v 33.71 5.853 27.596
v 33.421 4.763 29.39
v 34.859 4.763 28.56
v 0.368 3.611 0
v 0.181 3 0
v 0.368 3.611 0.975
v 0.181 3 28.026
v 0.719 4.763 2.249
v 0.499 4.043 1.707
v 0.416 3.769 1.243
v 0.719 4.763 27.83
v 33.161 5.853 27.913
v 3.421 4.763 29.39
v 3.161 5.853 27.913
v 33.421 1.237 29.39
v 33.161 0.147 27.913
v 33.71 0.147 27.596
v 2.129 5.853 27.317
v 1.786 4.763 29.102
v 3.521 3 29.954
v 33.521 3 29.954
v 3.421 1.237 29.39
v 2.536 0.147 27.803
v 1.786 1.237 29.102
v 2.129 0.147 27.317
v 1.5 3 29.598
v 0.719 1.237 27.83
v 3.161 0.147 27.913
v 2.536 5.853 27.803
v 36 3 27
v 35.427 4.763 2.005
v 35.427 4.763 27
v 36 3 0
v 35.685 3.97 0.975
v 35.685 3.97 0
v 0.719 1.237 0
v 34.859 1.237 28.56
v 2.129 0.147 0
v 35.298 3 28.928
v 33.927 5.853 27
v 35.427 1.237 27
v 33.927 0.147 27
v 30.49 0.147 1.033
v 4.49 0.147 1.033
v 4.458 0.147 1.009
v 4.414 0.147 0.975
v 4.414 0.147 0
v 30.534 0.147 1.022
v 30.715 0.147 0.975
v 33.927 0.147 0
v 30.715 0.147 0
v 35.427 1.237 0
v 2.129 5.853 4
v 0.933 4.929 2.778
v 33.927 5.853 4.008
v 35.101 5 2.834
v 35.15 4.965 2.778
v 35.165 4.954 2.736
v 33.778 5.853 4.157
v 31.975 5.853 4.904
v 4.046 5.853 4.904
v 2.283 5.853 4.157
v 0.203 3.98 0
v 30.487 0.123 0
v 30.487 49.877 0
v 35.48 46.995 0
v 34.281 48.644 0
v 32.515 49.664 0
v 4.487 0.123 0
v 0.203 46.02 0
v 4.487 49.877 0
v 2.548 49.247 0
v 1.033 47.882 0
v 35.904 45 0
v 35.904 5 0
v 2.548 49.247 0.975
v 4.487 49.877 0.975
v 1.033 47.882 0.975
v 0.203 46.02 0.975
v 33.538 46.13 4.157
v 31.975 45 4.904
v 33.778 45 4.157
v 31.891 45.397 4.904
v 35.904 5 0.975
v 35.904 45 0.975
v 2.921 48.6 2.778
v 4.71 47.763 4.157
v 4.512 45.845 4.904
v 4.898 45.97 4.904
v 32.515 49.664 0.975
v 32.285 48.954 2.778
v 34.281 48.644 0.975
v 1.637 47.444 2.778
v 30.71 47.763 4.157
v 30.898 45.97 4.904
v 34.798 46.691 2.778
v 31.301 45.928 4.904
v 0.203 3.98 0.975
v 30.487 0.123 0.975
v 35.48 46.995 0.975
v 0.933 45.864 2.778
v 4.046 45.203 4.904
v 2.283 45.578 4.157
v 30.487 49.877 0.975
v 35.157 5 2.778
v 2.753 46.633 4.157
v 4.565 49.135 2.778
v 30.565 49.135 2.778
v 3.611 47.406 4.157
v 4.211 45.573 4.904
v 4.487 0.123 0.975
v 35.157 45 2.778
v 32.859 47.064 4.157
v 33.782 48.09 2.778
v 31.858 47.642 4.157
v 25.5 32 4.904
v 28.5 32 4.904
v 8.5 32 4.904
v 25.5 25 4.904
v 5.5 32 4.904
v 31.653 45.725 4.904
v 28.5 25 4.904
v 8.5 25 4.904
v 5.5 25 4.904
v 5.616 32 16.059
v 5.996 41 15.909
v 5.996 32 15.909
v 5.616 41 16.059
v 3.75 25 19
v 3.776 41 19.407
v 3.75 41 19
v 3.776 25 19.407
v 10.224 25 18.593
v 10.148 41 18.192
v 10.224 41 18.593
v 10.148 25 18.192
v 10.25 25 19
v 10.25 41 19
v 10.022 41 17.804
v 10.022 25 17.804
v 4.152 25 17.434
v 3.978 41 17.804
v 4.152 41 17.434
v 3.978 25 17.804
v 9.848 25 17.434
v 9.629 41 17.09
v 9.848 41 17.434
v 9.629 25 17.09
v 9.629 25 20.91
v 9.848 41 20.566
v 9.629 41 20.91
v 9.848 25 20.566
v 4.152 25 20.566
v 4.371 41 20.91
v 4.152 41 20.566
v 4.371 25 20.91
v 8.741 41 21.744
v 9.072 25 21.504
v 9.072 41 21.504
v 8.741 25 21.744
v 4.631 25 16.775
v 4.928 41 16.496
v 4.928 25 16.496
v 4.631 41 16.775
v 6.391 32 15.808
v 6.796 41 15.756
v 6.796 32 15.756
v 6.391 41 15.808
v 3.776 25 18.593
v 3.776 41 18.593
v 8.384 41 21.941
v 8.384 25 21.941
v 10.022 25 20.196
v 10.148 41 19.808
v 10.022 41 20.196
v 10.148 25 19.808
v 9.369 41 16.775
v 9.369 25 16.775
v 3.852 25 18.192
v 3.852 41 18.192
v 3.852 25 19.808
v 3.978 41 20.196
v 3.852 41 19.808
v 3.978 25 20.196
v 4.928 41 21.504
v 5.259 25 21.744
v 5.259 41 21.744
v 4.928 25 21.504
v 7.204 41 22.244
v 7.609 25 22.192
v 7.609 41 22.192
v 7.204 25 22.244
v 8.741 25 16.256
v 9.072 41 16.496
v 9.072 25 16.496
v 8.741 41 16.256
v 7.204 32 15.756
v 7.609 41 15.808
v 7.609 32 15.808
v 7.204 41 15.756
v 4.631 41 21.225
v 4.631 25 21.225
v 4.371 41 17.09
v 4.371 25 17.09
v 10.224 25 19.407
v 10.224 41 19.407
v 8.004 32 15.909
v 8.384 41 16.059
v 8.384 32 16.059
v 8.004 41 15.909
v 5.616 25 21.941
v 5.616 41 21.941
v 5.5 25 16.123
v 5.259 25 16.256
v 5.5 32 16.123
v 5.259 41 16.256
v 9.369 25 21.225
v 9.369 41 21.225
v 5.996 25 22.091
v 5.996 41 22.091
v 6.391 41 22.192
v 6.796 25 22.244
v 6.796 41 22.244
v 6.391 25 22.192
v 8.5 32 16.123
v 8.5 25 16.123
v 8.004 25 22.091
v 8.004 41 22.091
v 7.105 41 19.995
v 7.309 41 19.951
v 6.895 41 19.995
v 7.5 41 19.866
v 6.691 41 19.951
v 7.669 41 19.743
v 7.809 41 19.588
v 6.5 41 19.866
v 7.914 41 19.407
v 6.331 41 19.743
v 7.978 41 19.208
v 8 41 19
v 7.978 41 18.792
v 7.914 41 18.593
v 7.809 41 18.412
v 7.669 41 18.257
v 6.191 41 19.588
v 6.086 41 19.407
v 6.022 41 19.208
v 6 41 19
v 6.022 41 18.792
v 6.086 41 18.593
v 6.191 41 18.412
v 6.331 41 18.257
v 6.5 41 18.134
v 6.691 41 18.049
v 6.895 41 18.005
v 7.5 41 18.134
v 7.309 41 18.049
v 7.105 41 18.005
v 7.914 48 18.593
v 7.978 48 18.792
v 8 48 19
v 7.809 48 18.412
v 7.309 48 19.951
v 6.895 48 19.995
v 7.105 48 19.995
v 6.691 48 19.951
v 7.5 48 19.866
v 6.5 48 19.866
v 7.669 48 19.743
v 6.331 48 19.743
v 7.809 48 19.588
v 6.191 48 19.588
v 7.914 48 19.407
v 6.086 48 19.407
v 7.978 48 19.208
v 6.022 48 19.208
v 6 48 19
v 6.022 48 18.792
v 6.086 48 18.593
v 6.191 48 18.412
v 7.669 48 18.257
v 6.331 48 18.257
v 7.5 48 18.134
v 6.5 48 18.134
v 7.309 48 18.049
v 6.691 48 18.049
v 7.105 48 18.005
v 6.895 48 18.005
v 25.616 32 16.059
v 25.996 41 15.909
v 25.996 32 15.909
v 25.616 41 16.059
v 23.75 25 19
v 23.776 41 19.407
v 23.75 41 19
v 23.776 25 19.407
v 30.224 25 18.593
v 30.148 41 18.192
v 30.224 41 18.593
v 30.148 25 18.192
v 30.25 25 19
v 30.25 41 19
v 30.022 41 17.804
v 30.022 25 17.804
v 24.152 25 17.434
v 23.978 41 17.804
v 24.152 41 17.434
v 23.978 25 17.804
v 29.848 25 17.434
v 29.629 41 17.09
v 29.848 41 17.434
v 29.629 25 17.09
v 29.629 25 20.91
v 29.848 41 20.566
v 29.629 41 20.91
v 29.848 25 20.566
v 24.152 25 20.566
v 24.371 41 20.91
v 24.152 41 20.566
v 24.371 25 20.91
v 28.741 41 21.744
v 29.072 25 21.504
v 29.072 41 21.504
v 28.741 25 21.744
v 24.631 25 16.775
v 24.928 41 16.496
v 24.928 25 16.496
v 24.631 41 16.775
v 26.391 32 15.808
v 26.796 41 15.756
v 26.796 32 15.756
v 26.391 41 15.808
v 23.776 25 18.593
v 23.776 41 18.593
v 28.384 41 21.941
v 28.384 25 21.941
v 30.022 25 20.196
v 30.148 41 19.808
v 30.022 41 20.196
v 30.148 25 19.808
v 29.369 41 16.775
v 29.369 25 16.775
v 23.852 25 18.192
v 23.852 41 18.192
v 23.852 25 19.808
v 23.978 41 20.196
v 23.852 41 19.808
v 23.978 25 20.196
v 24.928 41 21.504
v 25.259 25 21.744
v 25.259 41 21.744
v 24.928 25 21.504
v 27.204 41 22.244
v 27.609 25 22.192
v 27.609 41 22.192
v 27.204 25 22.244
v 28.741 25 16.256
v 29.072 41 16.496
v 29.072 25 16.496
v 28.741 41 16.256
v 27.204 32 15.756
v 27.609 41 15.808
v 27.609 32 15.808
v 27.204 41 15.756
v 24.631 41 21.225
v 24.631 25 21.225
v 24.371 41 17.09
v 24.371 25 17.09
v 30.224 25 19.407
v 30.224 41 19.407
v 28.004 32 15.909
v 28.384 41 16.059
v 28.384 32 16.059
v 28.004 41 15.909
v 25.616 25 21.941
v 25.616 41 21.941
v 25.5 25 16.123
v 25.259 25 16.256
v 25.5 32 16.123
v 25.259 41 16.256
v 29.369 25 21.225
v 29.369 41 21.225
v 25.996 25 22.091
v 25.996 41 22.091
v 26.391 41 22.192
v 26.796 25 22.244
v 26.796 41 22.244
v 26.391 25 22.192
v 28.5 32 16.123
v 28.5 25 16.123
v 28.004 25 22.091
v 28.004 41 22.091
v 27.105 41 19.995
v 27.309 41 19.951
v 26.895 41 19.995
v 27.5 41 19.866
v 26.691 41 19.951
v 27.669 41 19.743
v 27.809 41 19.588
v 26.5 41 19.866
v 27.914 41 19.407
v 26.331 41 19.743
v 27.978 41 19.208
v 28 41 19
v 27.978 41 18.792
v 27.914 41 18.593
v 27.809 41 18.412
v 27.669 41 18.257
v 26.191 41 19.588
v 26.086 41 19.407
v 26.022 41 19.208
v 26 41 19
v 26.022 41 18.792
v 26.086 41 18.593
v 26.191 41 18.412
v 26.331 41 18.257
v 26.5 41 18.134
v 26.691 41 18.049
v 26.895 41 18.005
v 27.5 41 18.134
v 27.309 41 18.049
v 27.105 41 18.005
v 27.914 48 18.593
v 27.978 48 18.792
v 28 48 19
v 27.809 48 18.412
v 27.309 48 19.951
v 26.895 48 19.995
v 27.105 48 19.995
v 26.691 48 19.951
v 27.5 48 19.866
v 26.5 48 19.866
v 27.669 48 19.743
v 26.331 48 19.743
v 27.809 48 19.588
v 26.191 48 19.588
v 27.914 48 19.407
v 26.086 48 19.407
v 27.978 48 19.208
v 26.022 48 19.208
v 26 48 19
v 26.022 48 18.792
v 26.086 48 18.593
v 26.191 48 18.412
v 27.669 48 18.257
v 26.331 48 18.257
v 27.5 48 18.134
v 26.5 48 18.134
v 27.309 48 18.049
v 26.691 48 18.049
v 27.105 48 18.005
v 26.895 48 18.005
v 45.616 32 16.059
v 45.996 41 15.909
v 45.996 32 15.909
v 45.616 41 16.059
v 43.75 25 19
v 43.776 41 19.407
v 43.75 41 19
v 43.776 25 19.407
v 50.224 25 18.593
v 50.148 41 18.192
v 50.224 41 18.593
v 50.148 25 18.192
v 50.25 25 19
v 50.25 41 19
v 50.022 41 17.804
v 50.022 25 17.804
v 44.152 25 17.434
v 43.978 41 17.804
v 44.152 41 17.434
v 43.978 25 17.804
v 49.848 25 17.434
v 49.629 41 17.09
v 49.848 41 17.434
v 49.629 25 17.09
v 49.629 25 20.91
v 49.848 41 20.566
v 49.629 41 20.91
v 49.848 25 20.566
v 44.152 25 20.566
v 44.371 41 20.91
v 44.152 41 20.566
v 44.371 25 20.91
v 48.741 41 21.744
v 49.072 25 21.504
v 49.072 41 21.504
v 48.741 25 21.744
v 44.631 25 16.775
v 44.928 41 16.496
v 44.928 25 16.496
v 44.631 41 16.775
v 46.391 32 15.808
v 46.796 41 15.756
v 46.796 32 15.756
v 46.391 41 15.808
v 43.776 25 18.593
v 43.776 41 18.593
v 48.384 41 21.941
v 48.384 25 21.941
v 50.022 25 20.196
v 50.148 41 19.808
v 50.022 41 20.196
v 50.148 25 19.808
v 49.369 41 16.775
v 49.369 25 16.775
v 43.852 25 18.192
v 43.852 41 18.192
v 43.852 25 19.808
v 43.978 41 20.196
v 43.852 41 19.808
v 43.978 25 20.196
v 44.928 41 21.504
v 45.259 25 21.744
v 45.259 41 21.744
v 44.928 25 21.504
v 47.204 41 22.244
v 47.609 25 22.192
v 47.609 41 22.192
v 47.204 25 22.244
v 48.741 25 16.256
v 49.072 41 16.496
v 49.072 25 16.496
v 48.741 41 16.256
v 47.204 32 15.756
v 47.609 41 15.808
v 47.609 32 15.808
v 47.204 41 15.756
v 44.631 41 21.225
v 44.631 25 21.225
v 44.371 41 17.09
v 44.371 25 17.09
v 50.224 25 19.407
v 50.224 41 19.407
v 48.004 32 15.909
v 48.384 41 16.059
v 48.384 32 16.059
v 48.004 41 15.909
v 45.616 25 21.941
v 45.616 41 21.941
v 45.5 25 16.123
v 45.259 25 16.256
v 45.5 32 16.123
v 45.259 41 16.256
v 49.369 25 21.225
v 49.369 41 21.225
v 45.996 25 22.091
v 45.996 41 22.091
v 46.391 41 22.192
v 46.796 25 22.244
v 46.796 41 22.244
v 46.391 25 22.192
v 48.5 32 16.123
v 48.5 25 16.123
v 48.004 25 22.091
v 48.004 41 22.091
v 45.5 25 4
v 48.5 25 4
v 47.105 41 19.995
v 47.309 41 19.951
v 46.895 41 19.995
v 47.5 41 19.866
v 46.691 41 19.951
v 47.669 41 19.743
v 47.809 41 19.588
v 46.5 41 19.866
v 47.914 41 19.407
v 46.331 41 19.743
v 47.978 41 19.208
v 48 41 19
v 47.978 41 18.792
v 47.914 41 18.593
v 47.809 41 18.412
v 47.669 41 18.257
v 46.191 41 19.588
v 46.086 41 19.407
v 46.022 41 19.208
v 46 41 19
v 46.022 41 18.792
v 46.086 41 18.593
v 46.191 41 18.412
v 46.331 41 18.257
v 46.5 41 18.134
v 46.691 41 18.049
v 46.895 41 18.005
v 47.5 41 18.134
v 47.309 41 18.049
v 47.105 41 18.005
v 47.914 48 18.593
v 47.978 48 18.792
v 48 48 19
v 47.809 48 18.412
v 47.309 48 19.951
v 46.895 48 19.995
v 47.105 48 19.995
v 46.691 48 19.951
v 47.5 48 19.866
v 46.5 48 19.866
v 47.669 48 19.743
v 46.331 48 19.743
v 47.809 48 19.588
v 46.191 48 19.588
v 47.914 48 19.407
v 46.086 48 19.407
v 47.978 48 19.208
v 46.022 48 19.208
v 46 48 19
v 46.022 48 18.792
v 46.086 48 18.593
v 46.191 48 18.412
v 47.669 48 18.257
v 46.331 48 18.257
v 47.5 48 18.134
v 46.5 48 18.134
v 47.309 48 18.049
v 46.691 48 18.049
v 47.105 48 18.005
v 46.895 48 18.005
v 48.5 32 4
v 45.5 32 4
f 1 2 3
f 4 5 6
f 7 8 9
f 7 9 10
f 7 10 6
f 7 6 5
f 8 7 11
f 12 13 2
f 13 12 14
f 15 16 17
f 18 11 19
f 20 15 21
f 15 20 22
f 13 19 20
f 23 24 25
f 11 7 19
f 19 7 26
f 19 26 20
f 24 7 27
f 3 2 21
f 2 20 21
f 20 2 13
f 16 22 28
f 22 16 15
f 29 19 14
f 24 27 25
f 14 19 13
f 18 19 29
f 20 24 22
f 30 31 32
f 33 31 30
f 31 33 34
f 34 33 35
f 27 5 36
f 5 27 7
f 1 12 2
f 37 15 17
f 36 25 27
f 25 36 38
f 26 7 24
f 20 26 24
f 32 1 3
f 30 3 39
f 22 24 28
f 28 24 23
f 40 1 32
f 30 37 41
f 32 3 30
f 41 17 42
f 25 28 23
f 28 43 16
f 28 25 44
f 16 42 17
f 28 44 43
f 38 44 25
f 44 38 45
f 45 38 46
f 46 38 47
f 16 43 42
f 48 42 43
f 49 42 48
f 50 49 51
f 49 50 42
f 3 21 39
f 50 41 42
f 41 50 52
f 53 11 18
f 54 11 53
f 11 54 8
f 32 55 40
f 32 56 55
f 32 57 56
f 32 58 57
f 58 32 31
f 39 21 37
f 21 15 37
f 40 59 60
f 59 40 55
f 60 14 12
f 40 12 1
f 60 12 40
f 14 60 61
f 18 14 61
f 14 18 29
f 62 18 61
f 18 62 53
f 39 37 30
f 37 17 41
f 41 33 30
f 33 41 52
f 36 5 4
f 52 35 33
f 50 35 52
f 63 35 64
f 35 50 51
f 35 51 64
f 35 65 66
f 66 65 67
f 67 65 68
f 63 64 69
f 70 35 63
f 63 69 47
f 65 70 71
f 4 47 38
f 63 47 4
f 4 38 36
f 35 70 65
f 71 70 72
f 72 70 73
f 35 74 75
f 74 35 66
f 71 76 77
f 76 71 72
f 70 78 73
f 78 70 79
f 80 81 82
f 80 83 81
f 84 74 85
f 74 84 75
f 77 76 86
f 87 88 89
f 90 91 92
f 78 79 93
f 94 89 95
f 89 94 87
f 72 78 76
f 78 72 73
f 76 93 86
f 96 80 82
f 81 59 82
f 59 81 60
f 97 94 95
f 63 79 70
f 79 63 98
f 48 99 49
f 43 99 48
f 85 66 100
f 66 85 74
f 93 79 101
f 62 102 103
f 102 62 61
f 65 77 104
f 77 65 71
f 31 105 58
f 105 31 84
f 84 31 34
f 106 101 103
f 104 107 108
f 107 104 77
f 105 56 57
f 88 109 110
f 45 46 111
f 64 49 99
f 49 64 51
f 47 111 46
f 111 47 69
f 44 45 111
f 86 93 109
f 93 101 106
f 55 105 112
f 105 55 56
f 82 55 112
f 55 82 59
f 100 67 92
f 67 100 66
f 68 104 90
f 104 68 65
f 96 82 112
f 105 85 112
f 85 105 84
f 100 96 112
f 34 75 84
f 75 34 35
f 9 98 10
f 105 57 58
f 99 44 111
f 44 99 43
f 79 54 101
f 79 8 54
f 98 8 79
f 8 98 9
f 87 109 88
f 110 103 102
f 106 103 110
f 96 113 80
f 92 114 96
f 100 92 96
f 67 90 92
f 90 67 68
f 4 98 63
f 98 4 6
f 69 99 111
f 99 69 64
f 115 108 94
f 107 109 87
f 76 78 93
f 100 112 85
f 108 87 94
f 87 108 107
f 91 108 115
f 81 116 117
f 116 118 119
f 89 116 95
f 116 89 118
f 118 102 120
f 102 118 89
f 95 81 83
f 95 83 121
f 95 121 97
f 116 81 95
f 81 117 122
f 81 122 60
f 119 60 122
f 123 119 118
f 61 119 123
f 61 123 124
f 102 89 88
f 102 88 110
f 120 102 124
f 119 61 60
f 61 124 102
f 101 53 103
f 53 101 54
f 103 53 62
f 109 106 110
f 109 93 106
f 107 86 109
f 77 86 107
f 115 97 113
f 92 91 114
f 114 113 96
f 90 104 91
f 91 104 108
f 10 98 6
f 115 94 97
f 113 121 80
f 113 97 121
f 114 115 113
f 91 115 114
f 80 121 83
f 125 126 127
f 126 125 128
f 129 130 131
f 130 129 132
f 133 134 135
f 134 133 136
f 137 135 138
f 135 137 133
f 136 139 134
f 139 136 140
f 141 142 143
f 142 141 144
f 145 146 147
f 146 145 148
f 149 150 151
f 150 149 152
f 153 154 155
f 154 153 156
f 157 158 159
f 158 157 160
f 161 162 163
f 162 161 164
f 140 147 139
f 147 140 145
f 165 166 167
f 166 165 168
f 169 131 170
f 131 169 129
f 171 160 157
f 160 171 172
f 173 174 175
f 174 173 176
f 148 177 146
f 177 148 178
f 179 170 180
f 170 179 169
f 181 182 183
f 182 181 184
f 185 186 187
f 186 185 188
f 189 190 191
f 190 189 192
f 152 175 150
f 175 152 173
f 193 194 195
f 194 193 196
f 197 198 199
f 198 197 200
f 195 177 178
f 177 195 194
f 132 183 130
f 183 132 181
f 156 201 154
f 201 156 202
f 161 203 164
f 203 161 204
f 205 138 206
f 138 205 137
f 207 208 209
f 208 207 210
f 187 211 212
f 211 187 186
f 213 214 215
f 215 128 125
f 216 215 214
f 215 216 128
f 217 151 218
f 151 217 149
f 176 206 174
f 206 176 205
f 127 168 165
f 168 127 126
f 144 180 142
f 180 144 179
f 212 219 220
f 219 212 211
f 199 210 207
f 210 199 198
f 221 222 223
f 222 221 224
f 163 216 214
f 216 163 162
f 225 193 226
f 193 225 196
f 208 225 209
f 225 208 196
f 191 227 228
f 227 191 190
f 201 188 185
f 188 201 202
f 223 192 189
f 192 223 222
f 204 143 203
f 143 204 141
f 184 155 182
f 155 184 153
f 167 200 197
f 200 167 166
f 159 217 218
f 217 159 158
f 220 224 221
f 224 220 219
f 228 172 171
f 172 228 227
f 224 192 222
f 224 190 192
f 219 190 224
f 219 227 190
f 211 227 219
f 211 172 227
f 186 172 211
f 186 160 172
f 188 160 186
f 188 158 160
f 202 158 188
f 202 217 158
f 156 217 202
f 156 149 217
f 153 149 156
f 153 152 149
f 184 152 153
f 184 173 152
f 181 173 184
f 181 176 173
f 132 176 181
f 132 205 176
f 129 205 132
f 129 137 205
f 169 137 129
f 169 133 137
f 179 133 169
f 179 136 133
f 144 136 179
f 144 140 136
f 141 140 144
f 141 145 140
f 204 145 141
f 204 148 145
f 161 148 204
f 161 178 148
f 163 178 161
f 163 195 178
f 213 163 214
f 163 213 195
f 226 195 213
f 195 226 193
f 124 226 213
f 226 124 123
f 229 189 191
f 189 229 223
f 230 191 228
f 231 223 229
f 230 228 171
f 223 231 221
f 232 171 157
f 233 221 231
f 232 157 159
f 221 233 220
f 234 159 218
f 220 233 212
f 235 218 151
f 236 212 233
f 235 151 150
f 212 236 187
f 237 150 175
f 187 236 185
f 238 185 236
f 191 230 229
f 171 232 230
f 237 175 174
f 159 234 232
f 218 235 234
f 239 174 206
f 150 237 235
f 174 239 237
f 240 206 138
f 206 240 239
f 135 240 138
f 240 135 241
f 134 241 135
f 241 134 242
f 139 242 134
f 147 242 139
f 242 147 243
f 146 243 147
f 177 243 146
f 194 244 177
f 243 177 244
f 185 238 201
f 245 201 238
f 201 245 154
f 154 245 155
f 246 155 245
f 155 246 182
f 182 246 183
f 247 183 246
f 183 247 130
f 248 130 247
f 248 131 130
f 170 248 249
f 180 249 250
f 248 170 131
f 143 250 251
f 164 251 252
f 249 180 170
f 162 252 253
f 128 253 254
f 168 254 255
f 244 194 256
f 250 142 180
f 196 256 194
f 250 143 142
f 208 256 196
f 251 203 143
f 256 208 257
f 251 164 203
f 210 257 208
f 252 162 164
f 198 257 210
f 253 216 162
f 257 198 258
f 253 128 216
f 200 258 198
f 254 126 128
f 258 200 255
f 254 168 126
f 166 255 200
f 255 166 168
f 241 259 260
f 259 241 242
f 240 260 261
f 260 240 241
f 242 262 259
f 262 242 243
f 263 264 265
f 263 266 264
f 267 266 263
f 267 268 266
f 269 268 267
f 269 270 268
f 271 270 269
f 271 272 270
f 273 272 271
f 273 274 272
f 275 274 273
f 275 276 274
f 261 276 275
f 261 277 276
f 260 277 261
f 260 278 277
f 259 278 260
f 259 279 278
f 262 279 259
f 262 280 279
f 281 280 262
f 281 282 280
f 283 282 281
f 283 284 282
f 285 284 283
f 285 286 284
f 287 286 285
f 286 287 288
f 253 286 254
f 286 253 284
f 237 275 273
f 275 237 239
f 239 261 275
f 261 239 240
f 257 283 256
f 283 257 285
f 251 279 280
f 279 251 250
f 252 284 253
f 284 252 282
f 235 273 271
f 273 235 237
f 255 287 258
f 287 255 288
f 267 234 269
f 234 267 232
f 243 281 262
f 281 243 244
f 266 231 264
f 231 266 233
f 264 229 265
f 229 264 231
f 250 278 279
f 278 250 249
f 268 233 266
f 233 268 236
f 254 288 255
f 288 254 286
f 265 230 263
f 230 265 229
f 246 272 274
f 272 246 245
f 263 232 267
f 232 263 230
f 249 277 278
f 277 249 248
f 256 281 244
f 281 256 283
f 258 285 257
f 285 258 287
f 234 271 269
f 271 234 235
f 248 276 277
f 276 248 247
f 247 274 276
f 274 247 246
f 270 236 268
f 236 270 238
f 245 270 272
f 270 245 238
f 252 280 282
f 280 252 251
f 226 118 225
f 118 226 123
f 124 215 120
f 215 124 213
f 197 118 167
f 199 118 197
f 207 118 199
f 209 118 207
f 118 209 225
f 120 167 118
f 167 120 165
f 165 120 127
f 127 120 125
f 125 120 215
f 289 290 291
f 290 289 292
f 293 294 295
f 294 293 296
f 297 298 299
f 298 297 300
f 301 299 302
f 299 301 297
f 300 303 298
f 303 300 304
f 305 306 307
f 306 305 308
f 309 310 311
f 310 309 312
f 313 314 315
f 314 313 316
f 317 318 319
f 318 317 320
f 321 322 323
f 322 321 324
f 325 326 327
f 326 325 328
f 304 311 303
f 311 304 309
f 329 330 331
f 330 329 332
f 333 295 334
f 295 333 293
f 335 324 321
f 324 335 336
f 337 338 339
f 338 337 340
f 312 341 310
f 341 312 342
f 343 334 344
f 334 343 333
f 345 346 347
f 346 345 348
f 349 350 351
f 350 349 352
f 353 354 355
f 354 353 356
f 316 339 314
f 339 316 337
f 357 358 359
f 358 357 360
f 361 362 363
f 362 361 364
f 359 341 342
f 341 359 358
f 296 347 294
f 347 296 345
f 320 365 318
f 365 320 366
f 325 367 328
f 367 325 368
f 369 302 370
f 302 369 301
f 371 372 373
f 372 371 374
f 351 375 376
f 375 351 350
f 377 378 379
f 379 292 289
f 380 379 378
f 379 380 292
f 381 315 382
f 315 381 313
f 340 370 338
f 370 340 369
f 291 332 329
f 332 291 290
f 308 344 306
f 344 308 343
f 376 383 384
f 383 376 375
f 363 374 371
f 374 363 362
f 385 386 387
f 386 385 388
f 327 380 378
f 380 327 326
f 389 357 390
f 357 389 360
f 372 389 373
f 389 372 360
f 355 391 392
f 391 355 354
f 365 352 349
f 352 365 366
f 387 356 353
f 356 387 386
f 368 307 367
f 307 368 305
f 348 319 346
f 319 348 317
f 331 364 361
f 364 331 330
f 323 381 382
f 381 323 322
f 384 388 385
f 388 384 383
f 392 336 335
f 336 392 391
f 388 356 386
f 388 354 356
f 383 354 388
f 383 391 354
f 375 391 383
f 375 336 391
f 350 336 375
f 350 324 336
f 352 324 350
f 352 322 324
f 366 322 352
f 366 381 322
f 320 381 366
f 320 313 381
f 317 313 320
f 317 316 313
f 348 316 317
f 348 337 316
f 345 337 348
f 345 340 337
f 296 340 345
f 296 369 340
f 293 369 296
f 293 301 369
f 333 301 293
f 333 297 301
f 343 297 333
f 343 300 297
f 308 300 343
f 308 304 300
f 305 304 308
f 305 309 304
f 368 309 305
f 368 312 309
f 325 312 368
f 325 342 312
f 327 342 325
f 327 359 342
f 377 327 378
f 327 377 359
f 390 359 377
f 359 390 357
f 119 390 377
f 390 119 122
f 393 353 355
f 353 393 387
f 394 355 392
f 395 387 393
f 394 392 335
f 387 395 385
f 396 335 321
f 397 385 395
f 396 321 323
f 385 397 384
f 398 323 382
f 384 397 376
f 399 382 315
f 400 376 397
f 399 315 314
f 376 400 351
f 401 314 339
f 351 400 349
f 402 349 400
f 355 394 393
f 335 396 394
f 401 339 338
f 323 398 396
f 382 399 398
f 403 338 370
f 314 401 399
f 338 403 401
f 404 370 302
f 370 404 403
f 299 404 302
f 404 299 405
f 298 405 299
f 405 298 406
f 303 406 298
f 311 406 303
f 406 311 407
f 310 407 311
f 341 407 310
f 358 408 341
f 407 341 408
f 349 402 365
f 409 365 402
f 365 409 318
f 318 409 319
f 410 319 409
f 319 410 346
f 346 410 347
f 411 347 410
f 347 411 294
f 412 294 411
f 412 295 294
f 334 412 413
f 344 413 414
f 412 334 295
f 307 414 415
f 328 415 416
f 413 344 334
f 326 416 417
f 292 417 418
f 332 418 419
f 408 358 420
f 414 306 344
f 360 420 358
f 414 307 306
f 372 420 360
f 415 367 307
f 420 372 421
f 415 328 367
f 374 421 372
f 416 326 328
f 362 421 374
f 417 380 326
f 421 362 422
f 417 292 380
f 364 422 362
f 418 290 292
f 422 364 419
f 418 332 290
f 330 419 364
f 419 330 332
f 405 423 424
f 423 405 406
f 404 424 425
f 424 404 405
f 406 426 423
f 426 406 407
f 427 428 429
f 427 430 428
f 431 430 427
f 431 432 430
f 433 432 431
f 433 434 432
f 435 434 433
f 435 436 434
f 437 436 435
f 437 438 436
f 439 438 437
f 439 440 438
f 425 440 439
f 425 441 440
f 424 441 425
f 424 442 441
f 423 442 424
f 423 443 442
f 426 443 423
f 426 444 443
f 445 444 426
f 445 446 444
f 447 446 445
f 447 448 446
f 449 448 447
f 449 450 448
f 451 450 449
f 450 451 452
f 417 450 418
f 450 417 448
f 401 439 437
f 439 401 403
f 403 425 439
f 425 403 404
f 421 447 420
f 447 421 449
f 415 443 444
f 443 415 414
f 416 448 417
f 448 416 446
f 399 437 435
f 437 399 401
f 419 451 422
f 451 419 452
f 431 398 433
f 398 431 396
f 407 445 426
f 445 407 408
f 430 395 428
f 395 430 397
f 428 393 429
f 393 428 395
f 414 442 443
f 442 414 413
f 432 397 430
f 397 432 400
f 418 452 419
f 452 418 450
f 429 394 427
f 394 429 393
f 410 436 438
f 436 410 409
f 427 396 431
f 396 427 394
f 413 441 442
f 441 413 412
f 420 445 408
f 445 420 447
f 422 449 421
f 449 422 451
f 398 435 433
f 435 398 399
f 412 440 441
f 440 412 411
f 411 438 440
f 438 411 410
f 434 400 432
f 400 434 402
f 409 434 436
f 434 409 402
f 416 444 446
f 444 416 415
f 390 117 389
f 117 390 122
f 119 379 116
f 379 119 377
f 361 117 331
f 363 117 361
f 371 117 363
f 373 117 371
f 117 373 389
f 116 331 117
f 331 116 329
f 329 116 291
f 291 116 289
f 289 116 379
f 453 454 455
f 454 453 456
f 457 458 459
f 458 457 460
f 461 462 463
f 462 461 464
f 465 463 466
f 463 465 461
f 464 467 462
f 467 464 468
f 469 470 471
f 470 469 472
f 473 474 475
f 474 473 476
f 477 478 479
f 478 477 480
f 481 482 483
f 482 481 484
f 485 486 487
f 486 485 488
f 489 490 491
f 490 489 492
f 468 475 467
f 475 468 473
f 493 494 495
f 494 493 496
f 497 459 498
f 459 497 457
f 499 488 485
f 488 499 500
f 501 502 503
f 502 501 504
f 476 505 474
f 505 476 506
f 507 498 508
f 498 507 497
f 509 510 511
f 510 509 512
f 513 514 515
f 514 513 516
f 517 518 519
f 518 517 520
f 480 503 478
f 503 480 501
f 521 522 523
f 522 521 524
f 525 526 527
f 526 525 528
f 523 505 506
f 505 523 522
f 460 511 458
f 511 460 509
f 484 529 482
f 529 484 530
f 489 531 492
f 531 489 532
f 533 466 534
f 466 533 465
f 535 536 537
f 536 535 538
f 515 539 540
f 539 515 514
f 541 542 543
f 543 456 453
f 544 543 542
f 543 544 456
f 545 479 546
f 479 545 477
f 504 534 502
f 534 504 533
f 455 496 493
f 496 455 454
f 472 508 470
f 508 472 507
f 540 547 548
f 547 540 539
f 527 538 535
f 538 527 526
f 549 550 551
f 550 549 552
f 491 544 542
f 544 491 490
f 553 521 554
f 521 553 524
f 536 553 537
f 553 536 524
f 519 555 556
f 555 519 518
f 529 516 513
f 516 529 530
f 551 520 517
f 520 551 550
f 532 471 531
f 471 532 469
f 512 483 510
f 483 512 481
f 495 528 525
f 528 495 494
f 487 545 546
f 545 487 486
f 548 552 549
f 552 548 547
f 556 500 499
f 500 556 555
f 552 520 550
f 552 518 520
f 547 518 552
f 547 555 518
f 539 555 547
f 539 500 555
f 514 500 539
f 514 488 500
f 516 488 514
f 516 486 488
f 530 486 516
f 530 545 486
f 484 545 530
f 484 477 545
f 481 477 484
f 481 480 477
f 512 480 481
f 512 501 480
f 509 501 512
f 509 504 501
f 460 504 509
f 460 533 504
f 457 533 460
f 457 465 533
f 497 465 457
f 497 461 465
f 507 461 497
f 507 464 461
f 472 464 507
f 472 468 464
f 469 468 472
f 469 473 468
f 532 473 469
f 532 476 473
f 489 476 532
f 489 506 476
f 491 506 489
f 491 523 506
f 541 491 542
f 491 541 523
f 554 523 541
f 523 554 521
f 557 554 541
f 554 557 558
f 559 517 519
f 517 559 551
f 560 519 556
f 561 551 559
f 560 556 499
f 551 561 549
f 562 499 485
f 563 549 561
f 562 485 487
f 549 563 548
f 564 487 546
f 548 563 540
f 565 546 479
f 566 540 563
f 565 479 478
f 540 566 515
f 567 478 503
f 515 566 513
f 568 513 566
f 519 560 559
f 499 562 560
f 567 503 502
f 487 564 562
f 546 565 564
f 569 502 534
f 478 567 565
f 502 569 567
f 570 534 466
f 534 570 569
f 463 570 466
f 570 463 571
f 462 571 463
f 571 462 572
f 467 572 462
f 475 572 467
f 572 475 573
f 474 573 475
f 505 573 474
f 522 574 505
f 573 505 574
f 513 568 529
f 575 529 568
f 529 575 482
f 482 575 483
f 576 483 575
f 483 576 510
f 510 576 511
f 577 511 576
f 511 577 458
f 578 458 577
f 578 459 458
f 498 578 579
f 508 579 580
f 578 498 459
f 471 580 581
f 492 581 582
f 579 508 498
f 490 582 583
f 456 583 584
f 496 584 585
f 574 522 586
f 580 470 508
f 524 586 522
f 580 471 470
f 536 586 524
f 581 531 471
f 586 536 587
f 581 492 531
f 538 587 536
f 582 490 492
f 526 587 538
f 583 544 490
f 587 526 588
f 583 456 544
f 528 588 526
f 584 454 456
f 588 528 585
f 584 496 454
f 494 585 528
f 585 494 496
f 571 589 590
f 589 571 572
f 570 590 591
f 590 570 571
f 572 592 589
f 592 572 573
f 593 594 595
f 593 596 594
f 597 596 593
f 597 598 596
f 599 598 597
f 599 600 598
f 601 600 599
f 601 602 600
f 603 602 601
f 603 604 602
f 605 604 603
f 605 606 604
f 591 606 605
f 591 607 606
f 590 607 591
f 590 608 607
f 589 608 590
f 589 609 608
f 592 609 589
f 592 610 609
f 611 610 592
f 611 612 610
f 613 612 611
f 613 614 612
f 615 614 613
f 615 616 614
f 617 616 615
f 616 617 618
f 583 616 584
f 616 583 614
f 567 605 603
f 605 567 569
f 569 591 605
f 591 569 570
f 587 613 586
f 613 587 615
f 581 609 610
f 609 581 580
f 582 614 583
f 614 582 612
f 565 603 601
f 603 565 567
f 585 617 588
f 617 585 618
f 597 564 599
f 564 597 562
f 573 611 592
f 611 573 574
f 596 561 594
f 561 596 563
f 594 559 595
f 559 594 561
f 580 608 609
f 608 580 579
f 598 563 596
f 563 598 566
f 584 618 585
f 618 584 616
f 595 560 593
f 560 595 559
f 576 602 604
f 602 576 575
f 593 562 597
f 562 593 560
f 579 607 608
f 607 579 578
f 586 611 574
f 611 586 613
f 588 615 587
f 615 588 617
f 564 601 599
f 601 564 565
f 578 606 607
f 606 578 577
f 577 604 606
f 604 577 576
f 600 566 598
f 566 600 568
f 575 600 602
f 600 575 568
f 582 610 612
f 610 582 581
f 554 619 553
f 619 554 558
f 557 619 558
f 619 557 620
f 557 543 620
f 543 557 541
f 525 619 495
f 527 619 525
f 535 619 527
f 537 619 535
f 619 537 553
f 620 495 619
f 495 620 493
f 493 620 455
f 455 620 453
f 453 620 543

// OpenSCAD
module rounded_surface_(size, r)
{
  assert(len(size)==2);
  hull()
    for(dx=[r, size[0]-r])
      for(dy=[r, size[1]-r])
        translate([dx, dy, r])
          sphere(r=r, $fn=r*3); // TODO: r*10!
}

module rounded_half_surface_(size, r)
{
  assert(len(size)==2);
  translate([0, 0, -r])
    difference()
    {
      rounded_surface_(size, r);
      cube([size[0], size[1], r]);
    }
}


// element for holding a single brush
module holder()
{
  translate([-3/2, 0, 0])
    cube([3, 7, 17]);
  translate([0, 0, 17-2])
  {
    rotate([-90, 0, 0])
      cylinder(r=(8-1.5)/2, h=7+2+7, $fn=50);
    translate([0, 7, 0])
      rotate([-90,0,0])
        cylinder(r=(3-1)/2, h=14+2, $fn=30);
  }
}


module whole_holder(names)
{
  // plate
  translate([0, 5+1, -5])
    rotate([90, 0, 0])
      difference()
      {
        rounded_surface_([36, 35], 3);
        cube([36, 5, 3*2]);
      }
  // back wall
  rounded_half_surface_([36, 50], 5);
  // holders
  for(i=[0:len(names)-1])
    translate([7+i*20, 25, 4])
      holder();
}


whole_holder(["John", "Jane", "Jackob"]);
